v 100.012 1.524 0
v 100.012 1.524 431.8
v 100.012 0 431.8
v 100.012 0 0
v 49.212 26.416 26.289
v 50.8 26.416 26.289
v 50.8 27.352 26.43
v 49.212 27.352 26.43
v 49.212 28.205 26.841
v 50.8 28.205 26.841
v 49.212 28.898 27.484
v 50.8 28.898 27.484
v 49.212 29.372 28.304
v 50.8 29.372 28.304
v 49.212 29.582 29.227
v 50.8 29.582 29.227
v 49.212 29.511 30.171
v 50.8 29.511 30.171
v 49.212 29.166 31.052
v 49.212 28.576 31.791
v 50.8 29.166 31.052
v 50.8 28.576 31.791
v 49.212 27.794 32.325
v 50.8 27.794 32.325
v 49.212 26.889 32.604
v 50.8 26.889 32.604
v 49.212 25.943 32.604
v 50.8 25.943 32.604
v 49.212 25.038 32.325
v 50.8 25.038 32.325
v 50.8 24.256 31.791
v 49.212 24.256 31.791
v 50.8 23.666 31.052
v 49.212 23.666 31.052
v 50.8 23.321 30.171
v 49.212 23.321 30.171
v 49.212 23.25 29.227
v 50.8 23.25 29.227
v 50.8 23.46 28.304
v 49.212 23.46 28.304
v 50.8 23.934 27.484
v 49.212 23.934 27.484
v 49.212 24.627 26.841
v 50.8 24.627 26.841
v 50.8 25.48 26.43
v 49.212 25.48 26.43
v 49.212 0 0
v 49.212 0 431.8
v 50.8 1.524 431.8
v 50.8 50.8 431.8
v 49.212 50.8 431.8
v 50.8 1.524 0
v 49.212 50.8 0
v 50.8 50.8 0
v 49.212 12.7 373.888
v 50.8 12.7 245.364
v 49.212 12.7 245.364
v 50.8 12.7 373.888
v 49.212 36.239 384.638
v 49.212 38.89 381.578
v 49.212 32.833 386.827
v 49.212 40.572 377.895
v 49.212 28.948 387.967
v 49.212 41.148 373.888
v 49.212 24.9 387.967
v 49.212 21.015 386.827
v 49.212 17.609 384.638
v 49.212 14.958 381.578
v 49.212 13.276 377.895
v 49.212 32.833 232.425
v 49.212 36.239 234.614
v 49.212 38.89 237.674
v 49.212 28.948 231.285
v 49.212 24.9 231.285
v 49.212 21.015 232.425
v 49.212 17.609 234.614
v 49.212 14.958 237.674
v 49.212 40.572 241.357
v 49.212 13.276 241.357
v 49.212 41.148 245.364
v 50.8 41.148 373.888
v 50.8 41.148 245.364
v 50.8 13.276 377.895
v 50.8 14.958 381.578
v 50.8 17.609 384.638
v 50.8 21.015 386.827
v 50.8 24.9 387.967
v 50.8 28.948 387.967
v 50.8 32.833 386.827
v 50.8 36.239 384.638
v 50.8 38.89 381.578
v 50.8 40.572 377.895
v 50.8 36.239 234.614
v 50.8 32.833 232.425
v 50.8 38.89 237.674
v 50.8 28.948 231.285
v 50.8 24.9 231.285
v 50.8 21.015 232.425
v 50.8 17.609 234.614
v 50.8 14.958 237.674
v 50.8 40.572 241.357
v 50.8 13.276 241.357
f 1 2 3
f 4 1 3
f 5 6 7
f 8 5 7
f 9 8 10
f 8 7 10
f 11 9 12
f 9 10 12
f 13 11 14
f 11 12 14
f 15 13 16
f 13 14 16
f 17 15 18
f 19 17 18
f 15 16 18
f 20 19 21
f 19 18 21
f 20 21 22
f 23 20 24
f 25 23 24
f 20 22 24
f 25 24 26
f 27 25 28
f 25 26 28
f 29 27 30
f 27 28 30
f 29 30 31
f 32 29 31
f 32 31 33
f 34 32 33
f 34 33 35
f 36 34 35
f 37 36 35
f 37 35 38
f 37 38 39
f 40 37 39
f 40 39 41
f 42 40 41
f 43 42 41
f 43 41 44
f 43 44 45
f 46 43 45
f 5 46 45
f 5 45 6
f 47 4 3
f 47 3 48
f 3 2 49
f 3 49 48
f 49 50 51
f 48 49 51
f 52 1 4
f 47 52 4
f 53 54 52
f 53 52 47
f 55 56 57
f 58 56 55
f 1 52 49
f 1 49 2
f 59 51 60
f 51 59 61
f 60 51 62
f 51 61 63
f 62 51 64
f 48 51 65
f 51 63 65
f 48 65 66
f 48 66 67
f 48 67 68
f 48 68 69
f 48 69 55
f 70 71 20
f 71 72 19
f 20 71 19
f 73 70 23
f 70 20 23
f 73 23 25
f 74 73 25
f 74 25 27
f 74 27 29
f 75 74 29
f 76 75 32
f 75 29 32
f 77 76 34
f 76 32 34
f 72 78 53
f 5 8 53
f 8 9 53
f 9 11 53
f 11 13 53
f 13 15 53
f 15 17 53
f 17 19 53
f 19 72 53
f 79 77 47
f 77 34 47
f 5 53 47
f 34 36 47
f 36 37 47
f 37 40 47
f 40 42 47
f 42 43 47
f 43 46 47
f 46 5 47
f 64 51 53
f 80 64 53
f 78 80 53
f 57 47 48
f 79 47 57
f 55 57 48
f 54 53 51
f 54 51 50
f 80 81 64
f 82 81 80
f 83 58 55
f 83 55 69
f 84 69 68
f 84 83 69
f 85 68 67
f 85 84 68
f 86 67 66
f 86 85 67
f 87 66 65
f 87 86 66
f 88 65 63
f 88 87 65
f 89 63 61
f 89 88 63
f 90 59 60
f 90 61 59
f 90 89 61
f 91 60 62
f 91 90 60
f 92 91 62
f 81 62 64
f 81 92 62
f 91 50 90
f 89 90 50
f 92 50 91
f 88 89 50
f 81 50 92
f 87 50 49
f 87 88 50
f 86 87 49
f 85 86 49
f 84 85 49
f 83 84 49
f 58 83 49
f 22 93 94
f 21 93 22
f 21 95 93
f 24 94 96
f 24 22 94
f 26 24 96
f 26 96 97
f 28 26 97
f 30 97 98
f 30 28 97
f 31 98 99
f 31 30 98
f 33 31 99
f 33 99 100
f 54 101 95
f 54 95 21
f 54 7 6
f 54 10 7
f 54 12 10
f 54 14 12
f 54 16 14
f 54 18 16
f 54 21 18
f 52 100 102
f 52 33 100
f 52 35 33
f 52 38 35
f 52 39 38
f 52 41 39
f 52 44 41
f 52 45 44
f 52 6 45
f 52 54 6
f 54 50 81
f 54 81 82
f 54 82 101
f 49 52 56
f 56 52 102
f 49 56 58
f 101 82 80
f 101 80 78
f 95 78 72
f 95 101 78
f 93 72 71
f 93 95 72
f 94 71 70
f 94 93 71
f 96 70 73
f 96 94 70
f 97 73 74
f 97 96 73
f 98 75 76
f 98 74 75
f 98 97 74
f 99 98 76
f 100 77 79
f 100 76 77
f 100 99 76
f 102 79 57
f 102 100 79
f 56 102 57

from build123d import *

# Parameters (mm, degrees)
BOSS_EXTRUDE2_DEPTH = 431.8
SKETCH8_R           = 3.175
CUT_EXTRUDE6_DEPTH  = 2.54


with BuildPart() as part:
    # Sketch3 → Boss-Extrude2 (new body)
    with BuildSketch(Plane.XY):
        Polygon((49.2125, 1.5875), (49.2125, 50.8), (50.8, 50.8), (50.8, 1.524), (100.0125, 1.524), (100.0125, 0), (49.2125, 0), align=None)
    extrude(amount=BOSS_EXTRUDE2_DEPTH)

    # Sketch8 → Cut-Extrude6 (cut)
    with BuildSketch(Plane(origin=(50.8, 0, 0), x_dir=(0, 0, -1), z_dir=(1, 0, 0))):
        with Locations((-29.464, 26.416)):
            Circle(SKETCH8_R)
        with BuildLine():
            Line((-245.364, 12.7), (-373.888, 12.7))
            ThreePointArc((-373.888, 12.7), (-388.112, 26.924), (-373.888, 41.148))
            Line((-373.888, 41.148), (-245.364, 41.148))
            ThreePointArc((-245.364, 41.148), (-231.14, 26.924), (-245.364, 12.7))
        make_face()
    extrude(amount=-CUT_EXTRUDE6_DEPTH, mode=Mode.SUBTRACT)


solid = part.part
